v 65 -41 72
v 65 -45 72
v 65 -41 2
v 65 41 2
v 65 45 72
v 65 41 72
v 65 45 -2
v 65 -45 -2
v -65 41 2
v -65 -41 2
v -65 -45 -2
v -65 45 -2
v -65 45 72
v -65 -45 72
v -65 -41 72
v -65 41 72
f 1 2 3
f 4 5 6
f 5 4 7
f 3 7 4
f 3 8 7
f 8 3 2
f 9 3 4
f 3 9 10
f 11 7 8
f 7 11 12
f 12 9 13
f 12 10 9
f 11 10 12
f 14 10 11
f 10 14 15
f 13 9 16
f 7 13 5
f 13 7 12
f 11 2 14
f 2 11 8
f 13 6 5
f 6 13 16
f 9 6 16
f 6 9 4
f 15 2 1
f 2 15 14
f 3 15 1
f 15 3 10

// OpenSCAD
// --- Dimensions (mm) ---
plate_width = 130;          // X dimension of the base plate
plate_depth = 90;           // Y dimension of the base plate
plate_thickness = 4;        // Z thickness of the base plate
wall_height = 70;           // Height of the side walls from the plate
wall_thickness = 4;         // Thickness of the side walls
hole_diameter = 30.5;       // Diameter of the tube holes
hole_spacing_x = 40;        // Center-to-center distance along X
hole_spacing_y = 40;        // Center-to-center distance along Y
num_holes_x = 3;            // Number of holes along X axis
num_holes_y = 2;            // Number of holes along Y axis

/* 
   PRINT ORIENTATION: 
   The user specifies the part is printed "upside down" and then flipped.
   In the print orientation (z=0 is the bed):
   - The plate is at the bottom (z=0 to 4).
   - The walls rise from the plate (z=4 to 70).
   - The holes are cut through the plate.
   - The part is centered on X and Y.
*/

$fn = 64;

// --- Main Assembly ---
union() {
    // 1. The Base Plate
    cube([plate_width, plate_depth, plate_thickness], center = true);

    // 2. The Two Side Walls
    // Walls are flush with the long edges (Y edges).
    // Since the plate is centered, the Y edges are at +/- plate_depth/2.
    // The walls are 130mm long (X) and 4mm thick (Y).
    
    // Wall 1 (at Y = plate_depth/2)
    translate([0, plate_depth/2 - wall_thickness/2, plate_thickness/2 + wall_height/2])
        cube([plate_width, wall_thickness, wall_height], center = true);
    
    // Wall 2 (at Y = -plate_depth/2)
    translate([0, -plate_depth/2 + wall_thickness/2, plate_thickness/2 + wall_height/2])
        cube([plate_width, wall_thickness, wall_height], center = true);
}

// --- Cutting Operations ---
difference() {
    // We use a dummy object to perform the difference on the whole assembly
    // but since we want to cut through the plate, we apply difference to the union.
    // To keep the code clean, we wrap the union in a difference.
    
    // (This is a structural logic choice: we subtract holes from the union above)
    // However, OpenSCAD requires the difference to wrap the object.
    // Let's re-structure the logic for a clean render.
}

// --- Corrected Structure for Rendering ---
// We will use a single difference block to ensure clean geometry.

difference() {
    // The Solid Part
    union() {
        // Base Plate
        cube([plate_width, plate_depth, plate_thickness], center = true);
        
        // Wall 1
        translate([0, plate_depth/2 - wall_thickness/2, plate_thickness/2 + wall_height/2])
            cube([plate_width, wall_thickness, wall_height], center = true);
            
        // Wall 2
        translate([0, -plate_depth/2 + wall_thickness/2, plate_thickness/2 + wall_height/2])
            cube([plate_width, wall_thickness, wall_height], center = true);
    }

    // The Holes
    // Holes are centered on the plate. 
    // Plate center is (0,0,0). 
    // X-range: -(3-1)*40/2 to +(3-1)*40/2 => -40 to 40.
    // Y-range: -(2-1)*40/2 to +(2-1)*40/2 => -20 to 20.
    
    for (i = [0 : num_holes_x - 1]) {
        for (j = [0 : num_holes_y - 1]) {
            // Calculate offsets from center
            // X offset: (i - (num_holes_x-1)/2) * spacing
            // Y offset: (j - (num_holes_y-1)/2) * spacing
            x_pos = (i - (num_holes_x - 1) / 2.0) * hole_spacing_x;
            y_pos = (j - (num_holes_y - 1) / 2.0) * hole_spacing_y;
            
            translate([x_pos, y_pos, 0])
                // Cylinder extends past the plate (z=0 and z=plate_thickness)
                // Plate is centered at 0, so it spans -2 to 2.
                // We extend cylinder from -5 to 7 to ensure clean cut.
                cylinder(h = plate_thickness + 10, d = hole_diameter, center = true);
        }
    }
}
